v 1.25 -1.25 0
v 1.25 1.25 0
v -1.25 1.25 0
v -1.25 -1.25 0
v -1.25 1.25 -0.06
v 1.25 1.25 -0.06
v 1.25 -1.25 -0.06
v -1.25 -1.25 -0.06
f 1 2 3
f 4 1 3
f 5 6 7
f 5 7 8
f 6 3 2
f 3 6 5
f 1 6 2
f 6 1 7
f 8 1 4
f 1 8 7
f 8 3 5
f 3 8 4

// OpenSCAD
// Tent shell kit: roof flat. See lib/lodge_kit.scad.
include <lib/lodge_kit.scad>
kind = "tent";
roof_tile([0, 0, 0, 0], 0);
